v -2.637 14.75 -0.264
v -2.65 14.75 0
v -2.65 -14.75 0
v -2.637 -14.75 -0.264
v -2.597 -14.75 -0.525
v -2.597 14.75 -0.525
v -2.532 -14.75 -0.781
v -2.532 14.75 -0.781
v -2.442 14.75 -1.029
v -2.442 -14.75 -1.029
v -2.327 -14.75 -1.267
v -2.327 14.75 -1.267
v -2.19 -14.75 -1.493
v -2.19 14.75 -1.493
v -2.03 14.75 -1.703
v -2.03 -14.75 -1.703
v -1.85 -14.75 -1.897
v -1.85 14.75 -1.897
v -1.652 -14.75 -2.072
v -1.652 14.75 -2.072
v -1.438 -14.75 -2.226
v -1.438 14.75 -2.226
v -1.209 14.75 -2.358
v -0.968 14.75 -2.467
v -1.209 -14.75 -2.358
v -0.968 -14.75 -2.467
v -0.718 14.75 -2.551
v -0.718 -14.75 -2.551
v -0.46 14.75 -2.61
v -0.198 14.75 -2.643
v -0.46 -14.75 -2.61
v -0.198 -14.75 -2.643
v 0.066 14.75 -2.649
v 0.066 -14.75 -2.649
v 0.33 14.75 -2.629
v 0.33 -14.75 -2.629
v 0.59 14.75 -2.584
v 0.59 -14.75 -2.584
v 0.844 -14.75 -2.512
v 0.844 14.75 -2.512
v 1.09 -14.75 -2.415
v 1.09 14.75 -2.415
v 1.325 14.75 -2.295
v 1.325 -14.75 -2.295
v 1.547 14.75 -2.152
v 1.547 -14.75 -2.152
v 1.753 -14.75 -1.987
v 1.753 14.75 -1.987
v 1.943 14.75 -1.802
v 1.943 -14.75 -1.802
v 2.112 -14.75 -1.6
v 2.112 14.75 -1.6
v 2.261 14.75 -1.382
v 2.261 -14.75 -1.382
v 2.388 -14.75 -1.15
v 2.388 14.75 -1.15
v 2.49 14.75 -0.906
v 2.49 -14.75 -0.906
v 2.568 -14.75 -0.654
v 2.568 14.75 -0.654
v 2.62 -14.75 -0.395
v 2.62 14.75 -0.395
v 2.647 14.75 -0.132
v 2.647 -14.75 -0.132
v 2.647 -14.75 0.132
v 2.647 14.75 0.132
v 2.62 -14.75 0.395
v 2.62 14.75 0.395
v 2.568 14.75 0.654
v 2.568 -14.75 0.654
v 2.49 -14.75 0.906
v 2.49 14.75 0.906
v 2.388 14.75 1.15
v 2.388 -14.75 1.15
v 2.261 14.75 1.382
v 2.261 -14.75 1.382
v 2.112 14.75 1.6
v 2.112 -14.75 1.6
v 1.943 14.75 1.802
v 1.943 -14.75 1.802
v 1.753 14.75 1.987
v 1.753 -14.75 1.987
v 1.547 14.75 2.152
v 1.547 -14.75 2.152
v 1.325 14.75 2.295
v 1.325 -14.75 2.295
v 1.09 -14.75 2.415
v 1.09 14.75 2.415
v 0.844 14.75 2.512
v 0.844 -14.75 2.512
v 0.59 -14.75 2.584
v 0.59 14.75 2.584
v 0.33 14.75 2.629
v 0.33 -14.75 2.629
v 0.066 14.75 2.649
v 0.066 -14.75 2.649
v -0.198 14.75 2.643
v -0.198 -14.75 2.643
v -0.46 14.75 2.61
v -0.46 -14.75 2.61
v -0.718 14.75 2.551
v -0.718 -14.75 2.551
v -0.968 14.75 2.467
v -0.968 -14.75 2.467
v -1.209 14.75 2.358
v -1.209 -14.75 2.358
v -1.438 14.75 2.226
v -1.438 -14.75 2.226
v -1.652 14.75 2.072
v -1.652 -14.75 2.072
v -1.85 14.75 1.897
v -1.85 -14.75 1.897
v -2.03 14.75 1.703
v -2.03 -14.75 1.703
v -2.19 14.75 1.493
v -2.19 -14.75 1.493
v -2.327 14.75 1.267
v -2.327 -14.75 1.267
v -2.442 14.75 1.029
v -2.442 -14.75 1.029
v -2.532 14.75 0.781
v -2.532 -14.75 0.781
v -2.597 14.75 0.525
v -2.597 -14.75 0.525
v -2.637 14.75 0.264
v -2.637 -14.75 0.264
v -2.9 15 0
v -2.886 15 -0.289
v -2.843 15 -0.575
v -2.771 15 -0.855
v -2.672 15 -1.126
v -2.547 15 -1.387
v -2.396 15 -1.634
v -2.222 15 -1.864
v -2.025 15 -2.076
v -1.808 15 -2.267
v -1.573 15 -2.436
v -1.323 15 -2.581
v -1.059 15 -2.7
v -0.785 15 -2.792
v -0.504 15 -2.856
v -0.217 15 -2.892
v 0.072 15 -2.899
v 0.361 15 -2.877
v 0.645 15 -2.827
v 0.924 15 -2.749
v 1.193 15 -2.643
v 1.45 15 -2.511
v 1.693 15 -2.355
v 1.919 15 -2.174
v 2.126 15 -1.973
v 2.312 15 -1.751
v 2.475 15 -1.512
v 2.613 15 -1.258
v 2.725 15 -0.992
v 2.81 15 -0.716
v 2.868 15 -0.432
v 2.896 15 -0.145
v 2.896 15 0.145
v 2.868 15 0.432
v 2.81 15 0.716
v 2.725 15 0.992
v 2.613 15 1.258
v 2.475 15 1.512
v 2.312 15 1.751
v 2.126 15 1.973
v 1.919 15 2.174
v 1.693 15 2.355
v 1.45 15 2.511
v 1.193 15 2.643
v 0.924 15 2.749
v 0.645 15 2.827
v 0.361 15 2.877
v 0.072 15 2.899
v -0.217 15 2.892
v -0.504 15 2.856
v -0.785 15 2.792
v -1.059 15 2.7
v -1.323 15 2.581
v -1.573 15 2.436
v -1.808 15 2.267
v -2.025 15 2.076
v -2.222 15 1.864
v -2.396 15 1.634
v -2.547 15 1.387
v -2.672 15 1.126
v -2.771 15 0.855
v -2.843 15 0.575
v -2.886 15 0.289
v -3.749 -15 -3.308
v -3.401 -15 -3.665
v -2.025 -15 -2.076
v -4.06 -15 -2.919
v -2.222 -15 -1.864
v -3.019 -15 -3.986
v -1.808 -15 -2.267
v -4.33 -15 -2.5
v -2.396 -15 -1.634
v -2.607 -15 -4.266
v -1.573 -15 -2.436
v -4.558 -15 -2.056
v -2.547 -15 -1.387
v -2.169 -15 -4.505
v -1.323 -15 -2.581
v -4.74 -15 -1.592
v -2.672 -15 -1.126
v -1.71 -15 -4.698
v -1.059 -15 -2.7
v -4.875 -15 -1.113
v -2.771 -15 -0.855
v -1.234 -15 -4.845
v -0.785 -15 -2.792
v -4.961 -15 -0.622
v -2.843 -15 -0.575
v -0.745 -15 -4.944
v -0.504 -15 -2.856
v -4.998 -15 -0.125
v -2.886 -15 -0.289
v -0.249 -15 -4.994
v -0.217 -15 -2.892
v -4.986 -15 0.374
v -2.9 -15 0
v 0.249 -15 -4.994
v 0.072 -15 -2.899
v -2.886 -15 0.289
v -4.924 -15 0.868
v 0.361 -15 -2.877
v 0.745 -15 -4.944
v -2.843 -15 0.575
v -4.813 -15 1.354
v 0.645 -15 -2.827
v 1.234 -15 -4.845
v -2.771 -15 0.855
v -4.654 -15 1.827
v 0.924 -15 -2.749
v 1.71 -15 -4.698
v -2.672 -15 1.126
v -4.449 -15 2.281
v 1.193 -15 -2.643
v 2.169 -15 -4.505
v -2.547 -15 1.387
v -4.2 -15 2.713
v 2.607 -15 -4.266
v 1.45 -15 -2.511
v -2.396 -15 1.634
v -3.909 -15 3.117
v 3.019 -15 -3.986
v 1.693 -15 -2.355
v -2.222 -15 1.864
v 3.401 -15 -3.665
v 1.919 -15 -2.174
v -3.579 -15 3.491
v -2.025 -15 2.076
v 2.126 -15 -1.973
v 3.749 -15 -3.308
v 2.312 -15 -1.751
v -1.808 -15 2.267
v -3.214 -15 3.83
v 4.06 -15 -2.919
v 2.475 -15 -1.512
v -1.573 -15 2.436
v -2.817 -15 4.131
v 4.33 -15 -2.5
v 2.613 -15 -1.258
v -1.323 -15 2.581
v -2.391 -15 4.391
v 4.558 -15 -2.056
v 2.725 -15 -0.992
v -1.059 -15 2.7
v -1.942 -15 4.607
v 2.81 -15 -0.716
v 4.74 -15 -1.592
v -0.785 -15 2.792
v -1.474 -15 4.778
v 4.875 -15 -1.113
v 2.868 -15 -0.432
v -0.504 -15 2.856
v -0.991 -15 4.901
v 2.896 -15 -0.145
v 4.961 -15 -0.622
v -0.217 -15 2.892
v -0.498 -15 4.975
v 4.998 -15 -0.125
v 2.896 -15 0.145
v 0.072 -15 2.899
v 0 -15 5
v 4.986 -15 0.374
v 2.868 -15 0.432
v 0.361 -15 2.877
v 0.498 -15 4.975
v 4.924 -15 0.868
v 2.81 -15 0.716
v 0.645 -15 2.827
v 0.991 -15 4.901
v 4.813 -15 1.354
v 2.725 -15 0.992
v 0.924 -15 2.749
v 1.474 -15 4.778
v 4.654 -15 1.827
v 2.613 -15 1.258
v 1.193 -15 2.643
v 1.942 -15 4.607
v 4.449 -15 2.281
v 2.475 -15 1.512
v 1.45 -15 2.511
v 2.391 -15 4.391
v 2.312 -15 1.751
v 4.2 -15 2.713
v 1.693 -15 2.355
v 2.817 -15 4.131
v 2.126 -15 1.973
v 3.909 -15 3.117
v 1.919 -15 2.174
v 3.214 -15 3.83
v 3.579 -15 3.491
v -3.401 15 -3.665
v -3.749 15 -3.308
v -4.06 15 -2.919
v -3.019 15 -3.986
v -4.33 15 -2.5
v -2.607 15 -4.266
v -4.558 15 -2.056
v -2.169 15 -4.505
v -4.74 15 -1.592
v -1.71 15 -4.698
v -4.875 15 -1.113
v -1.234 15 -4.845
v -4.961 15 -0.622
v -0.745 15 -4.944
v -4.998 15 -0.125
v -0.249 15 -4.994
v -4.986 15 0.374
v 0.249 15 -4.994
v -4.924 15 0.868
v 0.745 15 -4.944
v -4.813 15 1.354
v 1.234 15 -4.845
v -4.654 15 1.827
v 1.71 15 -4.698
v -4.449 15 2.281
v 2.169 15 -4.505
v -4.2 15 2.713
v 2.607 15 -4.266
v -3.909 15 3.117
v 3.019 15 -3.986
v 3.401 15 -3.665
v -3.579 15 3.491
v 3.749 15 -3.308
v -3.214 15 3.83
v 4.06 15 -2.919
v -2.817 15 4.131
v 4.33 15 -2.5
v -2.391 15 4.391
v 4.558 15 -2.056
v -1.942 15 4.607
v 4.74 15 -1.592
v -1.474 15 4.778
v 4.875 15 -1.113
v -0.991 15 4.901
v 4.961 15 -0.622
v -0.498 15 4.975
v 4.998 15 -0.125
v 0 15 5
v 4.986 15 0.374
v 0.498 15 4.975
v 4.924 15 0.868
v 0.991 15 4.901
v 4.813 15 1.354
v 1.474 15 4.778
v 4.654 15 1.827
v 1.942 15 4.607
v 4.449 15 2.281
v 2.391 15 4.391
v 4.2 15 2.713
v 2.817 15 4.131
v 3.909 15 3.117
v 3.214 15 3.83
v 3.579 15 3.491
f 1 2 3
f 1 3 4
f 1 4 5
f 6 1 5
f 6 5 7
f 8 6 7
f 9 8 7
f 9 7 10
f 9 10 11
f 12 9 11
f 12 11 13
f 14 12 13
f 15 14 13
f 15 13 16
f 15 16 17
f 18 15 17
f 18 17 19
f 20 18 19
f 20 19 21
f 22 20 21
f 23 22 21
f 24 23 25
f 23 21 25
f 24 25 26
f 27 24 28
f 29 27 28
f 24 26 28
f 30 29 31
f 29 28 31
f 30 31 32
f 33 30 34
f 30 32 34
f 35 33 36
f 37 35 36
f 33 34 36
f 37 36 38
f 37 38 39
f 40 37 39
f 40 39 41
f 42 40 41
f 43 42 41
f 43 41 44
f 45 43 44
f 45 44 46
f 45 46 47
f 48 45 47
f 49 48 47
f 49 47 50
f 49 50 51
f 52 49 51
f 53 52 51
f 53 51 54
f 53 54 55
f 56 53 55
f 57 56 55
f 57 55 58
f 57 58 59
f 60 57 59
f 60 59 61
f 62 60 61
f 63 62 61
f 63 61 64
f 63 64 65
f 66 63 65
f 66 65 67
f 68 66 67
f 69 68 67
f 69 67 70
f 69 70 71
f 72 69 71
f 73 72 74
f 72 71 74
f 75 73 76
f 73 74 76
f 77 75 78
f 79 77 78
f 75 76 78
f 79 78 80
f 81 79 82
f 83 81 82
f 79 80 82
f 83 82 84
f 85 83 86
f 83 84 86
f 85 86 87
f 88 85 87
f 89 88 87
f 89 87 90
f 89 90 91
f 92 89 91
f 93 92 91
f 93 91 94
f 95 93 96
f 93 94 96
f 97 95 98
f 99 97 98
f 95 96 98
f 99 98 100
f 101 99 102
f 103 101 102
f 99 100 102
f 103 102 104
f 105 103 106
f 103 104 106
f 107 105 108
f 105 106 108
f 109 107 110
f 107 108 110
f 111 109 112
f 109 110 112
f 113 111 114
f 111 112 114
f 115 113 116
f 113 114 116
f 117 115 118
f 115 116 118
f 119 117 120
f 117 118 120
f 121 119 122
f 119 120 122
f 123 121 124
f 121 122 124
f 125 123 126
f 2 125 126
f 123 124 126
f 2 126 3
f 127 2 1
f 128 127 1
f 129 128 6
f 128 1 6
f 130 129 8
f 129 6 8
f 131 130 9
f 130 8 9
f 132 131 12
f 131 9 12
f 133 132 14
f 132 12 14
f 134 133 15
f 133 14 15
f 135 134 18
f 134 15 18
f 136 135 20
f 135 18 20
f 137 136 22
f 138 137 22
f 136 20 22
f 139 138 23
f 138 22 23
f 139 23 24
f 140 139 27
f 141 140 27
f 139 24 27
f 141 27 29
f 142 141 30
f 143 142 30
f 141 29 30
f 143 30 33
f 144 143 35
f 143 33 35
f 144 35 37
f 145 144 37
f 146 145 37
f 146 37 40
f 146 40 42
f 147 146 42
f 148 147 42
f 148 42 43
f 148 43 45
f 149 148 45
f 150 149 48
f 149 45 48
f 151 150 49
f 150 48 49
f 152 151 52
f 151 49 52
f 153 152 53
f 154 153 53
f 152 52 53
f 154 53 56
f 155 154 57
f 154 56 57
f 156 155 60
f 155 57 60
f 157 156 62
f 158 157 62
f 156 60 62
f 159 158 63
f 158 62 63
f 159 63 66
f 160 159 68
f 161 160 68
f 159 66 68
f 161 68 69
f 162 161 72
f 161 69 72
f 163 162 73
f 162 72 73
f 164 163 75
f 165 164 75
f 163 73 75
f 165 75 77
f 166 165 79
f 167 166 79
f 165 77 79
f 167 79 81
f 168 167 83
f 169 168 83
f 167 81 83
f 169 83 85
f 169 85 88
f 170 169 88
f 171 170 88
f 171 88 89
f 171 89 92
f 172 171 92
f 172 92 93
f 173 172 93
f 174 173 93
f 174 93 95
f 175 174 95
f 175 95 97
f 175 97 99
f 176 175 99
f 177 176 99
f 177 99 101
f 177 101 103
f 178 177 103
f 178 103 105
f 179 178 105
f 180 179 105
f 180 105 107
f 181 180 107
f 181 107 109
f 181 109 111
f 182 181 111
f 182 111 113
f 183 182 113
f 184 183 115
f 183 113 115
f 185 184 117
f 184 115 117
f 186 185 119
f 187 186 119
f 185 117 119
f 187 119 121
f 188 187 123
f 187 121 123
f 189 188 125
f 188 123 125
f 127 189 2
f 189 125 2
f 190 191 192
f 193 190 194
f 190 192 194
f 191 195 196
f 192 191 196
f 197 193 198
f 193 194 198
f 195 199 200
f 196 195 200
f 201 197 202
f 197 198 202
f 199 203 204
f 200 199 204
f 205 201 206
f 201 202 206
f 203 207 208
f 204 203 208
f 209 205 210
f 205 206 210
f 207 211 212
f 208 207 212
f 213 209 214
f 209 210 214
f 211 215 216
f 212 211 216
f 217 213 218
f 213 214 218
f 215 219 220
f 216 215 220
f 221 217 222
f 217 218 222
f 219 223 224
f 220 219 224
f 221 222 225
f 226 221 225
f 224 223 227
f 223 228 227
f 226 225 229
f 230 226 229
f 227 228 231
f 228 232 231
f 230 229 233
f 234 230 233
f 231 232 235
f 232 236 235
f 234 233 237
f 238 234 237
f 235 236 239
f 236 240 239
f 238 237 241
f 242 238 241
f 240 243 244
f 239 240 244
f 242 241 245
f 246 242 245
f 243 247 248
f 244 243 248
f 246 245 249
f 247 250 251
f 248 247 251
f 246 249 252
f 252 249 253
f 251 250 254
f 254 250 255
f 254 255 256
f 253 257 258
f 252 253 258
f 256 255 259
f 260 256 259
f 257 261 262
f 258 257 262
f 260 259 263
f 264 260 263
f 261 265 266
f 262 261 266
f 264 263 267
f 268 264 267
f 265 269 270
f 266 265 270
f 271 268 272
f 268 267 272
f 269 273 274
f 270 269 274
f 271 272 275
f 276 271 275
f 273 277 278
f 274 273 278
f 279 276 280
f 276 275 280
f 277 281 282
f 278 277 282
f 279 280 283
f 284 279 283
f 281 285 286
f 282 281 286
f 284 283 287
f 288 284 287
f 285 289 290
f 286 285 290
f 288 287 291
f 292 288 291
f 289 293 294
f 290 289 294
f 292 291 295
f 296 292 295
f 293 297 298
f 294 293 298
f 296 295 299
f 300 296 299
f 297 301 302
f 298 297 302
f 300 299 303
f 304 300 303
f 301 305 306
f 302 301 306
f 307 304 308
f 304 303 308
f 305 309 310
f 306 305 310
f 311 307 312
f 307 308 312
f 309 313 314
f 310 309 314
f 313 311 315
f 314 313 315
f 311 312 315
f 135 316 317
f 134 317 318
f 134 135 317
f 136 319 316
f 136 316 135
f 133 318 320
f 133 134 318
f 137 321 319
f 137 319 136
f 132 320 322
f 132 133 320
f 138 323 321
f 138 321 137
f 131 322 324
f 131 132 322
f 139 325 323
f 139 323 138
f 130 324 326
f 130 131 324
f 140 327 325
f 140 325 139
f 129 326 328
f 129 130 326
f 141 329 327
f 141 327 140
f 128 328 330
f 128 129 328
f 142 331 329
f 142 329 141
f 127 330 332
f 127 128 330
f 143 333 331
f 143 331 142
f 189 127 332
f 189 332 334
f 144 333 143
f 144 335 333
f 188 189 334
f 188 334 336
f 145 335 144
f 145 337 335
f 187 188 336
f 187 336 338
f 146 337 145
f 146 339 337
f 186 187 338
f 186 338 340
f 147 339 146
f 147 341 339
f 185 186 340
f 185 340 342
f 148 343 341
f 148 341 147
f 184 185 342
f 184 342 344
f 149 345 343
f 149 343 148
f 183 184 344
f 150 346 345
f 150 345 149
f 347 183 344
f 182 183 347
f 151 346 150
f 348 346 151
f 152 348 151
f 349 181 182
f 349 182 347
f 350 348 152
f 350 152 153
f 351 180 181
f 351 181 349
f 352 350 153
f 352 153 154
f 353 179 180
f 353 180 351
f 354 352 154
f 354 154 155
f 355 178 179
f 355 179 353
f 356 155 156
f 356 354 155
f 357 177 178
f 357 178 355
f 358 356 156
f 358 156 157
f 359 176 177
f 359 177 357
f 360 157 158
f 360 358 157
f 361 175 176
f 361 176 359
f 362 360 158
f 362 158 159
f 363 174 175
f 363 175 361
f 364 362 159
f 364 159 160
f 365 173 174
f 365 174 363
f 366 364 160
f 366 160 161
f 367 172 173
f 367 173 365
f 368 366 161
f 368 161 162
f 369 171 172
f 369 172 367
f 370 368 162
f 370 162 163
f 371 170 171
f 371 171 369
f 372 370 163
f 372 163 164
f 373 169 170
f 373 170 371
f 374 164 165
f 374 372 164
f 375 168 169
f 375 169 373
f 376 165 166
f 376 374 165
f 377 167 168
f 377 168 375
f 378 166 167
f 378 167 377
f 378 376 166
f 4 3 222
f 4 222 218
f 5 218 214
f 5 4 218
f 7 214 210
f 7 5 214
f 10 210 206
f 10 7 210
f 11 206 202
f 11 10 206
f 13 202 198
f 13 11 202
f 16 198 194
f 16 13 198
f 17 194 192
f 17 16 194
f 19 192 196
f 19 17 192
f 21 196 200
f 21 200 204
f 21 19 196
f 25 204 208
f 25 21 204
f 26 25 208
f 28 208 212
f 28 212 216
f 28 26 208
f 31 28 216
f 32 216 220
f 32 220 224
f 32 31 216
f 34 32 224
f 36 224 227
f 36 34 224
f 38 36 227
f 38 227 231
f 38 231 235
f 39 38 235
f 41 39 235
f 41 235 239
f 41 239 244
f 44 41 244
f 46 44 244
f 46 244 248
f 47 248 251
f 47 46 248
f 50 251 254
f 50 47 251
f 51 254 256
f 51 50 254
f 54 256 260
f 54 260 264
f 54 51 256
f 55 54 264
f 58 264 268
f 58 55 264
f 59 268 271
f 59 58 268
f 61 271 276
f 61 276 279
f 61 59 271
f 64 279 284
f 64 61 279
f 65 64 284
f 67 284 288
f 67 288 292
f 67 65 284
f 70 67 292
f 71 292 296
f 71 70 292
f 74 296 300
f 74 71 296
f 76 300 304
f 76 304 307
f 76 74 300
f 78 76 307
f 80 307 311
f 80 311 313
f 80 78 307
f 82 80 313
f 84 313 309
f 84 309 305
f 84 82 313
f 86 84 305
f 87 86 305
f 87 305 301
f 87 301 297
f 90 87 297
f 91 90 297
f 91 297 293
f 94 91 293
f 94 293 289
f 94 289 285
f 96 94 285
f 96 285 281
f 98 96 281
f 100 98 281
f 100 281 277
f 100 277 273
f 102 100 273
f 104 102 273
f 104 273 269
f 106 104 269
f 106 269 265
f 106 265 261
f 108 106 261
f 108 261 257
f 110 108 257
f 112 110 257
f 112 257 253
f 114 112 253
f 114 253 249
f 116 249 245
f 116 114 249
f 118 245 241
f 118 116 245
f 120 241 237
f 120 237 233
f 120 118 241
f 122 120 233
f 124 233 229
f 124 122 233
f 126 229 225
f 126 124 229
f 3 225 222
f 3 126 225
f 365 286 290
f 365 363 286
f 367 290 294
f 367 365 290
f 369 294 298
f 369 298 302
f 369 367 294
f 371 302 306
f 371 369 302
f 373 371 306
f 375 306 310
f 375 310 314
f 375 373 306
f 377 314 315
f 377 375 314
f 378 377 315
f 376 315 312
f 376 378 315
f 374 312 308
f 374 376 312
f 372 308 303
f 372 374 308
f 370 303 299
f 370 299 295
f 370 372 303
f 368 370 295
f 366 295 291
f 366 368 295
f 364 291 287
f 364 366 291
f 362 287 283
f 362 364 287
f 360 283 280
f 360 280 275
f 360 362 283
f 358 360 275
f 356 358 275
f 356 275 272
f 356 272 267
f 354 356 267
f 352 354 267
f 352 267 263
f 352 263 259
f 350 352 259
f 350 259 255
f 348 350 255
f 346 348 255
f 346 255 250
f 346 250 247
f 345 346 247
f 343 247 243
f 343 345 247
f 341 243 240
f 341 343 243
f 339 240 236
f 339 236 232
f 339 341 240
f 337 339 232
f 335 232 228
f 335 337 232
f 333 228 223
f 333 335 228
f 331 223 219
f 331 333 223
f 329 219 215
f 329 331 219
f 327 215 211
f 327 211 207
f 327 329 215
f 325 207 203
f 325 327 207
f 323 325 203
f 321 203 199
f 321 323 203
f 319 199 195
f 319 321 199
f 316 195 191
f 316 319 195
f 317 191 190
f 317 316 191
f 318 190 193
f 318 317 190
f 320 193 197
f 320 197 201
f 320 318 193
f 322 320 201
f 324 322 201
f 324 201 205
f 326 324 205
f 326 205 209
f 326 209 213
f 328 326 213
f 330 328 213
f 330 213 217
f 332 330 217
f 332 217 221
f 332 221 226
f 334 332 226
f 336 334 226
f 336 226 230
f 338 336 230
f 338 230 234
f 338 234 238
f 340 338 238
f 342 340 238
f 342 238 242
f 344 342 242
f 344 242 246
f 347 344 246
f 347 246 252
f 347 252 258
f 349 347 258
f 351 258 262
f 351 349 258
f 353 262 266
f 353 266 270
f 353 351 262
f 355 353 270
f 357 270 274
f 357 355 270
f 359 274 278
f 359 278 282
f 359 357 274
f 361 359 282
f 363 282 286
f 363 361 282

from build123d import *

# Parameters (mm, degrees)
SKETCH1_R            = 5
BOSS_EXTRUDE1_DEPTH  = 15
M5_CLEARANCE_HOLE1_D = 5.3
CHAMFER1_SIZE        = 0.25


with BuildPart() as part:
    # Sketch1 → Boss-Extrude1 (new, symmetric)
    with BuildSketch(Plane(origin=(0, 0, 0), x_dir=(1, 0, 0), z_dir=(0, 1, 0))):
        with Locations(Location((0, 0, 0), (0, 0, 270))):
            Circle(SKETCH1_R)
    extrude(amount=BOSS_EXTRUDE1_DEPTH, both=True)

    # M5 Clearance Hole1 (through all)
    with Locations(Plane(origin=(0, 15, 0), x_dir=(1, 0, 0), z_dir=(0, 1, 0))):
        with Locations((0, 0)):
            Hole(M5_CLEARANCE_HOLE1_D / 2)

    # Chamfer1
    chamfer1_edges = [part.edges().sort_by_distance(p)[0] for p in [
        (2.65, 15, 0),
        (2.65, -15, 0),
    ]]
    chamfer(chamfer1_edges, length=CHAMFER1_SIZE)


solid = part.part
